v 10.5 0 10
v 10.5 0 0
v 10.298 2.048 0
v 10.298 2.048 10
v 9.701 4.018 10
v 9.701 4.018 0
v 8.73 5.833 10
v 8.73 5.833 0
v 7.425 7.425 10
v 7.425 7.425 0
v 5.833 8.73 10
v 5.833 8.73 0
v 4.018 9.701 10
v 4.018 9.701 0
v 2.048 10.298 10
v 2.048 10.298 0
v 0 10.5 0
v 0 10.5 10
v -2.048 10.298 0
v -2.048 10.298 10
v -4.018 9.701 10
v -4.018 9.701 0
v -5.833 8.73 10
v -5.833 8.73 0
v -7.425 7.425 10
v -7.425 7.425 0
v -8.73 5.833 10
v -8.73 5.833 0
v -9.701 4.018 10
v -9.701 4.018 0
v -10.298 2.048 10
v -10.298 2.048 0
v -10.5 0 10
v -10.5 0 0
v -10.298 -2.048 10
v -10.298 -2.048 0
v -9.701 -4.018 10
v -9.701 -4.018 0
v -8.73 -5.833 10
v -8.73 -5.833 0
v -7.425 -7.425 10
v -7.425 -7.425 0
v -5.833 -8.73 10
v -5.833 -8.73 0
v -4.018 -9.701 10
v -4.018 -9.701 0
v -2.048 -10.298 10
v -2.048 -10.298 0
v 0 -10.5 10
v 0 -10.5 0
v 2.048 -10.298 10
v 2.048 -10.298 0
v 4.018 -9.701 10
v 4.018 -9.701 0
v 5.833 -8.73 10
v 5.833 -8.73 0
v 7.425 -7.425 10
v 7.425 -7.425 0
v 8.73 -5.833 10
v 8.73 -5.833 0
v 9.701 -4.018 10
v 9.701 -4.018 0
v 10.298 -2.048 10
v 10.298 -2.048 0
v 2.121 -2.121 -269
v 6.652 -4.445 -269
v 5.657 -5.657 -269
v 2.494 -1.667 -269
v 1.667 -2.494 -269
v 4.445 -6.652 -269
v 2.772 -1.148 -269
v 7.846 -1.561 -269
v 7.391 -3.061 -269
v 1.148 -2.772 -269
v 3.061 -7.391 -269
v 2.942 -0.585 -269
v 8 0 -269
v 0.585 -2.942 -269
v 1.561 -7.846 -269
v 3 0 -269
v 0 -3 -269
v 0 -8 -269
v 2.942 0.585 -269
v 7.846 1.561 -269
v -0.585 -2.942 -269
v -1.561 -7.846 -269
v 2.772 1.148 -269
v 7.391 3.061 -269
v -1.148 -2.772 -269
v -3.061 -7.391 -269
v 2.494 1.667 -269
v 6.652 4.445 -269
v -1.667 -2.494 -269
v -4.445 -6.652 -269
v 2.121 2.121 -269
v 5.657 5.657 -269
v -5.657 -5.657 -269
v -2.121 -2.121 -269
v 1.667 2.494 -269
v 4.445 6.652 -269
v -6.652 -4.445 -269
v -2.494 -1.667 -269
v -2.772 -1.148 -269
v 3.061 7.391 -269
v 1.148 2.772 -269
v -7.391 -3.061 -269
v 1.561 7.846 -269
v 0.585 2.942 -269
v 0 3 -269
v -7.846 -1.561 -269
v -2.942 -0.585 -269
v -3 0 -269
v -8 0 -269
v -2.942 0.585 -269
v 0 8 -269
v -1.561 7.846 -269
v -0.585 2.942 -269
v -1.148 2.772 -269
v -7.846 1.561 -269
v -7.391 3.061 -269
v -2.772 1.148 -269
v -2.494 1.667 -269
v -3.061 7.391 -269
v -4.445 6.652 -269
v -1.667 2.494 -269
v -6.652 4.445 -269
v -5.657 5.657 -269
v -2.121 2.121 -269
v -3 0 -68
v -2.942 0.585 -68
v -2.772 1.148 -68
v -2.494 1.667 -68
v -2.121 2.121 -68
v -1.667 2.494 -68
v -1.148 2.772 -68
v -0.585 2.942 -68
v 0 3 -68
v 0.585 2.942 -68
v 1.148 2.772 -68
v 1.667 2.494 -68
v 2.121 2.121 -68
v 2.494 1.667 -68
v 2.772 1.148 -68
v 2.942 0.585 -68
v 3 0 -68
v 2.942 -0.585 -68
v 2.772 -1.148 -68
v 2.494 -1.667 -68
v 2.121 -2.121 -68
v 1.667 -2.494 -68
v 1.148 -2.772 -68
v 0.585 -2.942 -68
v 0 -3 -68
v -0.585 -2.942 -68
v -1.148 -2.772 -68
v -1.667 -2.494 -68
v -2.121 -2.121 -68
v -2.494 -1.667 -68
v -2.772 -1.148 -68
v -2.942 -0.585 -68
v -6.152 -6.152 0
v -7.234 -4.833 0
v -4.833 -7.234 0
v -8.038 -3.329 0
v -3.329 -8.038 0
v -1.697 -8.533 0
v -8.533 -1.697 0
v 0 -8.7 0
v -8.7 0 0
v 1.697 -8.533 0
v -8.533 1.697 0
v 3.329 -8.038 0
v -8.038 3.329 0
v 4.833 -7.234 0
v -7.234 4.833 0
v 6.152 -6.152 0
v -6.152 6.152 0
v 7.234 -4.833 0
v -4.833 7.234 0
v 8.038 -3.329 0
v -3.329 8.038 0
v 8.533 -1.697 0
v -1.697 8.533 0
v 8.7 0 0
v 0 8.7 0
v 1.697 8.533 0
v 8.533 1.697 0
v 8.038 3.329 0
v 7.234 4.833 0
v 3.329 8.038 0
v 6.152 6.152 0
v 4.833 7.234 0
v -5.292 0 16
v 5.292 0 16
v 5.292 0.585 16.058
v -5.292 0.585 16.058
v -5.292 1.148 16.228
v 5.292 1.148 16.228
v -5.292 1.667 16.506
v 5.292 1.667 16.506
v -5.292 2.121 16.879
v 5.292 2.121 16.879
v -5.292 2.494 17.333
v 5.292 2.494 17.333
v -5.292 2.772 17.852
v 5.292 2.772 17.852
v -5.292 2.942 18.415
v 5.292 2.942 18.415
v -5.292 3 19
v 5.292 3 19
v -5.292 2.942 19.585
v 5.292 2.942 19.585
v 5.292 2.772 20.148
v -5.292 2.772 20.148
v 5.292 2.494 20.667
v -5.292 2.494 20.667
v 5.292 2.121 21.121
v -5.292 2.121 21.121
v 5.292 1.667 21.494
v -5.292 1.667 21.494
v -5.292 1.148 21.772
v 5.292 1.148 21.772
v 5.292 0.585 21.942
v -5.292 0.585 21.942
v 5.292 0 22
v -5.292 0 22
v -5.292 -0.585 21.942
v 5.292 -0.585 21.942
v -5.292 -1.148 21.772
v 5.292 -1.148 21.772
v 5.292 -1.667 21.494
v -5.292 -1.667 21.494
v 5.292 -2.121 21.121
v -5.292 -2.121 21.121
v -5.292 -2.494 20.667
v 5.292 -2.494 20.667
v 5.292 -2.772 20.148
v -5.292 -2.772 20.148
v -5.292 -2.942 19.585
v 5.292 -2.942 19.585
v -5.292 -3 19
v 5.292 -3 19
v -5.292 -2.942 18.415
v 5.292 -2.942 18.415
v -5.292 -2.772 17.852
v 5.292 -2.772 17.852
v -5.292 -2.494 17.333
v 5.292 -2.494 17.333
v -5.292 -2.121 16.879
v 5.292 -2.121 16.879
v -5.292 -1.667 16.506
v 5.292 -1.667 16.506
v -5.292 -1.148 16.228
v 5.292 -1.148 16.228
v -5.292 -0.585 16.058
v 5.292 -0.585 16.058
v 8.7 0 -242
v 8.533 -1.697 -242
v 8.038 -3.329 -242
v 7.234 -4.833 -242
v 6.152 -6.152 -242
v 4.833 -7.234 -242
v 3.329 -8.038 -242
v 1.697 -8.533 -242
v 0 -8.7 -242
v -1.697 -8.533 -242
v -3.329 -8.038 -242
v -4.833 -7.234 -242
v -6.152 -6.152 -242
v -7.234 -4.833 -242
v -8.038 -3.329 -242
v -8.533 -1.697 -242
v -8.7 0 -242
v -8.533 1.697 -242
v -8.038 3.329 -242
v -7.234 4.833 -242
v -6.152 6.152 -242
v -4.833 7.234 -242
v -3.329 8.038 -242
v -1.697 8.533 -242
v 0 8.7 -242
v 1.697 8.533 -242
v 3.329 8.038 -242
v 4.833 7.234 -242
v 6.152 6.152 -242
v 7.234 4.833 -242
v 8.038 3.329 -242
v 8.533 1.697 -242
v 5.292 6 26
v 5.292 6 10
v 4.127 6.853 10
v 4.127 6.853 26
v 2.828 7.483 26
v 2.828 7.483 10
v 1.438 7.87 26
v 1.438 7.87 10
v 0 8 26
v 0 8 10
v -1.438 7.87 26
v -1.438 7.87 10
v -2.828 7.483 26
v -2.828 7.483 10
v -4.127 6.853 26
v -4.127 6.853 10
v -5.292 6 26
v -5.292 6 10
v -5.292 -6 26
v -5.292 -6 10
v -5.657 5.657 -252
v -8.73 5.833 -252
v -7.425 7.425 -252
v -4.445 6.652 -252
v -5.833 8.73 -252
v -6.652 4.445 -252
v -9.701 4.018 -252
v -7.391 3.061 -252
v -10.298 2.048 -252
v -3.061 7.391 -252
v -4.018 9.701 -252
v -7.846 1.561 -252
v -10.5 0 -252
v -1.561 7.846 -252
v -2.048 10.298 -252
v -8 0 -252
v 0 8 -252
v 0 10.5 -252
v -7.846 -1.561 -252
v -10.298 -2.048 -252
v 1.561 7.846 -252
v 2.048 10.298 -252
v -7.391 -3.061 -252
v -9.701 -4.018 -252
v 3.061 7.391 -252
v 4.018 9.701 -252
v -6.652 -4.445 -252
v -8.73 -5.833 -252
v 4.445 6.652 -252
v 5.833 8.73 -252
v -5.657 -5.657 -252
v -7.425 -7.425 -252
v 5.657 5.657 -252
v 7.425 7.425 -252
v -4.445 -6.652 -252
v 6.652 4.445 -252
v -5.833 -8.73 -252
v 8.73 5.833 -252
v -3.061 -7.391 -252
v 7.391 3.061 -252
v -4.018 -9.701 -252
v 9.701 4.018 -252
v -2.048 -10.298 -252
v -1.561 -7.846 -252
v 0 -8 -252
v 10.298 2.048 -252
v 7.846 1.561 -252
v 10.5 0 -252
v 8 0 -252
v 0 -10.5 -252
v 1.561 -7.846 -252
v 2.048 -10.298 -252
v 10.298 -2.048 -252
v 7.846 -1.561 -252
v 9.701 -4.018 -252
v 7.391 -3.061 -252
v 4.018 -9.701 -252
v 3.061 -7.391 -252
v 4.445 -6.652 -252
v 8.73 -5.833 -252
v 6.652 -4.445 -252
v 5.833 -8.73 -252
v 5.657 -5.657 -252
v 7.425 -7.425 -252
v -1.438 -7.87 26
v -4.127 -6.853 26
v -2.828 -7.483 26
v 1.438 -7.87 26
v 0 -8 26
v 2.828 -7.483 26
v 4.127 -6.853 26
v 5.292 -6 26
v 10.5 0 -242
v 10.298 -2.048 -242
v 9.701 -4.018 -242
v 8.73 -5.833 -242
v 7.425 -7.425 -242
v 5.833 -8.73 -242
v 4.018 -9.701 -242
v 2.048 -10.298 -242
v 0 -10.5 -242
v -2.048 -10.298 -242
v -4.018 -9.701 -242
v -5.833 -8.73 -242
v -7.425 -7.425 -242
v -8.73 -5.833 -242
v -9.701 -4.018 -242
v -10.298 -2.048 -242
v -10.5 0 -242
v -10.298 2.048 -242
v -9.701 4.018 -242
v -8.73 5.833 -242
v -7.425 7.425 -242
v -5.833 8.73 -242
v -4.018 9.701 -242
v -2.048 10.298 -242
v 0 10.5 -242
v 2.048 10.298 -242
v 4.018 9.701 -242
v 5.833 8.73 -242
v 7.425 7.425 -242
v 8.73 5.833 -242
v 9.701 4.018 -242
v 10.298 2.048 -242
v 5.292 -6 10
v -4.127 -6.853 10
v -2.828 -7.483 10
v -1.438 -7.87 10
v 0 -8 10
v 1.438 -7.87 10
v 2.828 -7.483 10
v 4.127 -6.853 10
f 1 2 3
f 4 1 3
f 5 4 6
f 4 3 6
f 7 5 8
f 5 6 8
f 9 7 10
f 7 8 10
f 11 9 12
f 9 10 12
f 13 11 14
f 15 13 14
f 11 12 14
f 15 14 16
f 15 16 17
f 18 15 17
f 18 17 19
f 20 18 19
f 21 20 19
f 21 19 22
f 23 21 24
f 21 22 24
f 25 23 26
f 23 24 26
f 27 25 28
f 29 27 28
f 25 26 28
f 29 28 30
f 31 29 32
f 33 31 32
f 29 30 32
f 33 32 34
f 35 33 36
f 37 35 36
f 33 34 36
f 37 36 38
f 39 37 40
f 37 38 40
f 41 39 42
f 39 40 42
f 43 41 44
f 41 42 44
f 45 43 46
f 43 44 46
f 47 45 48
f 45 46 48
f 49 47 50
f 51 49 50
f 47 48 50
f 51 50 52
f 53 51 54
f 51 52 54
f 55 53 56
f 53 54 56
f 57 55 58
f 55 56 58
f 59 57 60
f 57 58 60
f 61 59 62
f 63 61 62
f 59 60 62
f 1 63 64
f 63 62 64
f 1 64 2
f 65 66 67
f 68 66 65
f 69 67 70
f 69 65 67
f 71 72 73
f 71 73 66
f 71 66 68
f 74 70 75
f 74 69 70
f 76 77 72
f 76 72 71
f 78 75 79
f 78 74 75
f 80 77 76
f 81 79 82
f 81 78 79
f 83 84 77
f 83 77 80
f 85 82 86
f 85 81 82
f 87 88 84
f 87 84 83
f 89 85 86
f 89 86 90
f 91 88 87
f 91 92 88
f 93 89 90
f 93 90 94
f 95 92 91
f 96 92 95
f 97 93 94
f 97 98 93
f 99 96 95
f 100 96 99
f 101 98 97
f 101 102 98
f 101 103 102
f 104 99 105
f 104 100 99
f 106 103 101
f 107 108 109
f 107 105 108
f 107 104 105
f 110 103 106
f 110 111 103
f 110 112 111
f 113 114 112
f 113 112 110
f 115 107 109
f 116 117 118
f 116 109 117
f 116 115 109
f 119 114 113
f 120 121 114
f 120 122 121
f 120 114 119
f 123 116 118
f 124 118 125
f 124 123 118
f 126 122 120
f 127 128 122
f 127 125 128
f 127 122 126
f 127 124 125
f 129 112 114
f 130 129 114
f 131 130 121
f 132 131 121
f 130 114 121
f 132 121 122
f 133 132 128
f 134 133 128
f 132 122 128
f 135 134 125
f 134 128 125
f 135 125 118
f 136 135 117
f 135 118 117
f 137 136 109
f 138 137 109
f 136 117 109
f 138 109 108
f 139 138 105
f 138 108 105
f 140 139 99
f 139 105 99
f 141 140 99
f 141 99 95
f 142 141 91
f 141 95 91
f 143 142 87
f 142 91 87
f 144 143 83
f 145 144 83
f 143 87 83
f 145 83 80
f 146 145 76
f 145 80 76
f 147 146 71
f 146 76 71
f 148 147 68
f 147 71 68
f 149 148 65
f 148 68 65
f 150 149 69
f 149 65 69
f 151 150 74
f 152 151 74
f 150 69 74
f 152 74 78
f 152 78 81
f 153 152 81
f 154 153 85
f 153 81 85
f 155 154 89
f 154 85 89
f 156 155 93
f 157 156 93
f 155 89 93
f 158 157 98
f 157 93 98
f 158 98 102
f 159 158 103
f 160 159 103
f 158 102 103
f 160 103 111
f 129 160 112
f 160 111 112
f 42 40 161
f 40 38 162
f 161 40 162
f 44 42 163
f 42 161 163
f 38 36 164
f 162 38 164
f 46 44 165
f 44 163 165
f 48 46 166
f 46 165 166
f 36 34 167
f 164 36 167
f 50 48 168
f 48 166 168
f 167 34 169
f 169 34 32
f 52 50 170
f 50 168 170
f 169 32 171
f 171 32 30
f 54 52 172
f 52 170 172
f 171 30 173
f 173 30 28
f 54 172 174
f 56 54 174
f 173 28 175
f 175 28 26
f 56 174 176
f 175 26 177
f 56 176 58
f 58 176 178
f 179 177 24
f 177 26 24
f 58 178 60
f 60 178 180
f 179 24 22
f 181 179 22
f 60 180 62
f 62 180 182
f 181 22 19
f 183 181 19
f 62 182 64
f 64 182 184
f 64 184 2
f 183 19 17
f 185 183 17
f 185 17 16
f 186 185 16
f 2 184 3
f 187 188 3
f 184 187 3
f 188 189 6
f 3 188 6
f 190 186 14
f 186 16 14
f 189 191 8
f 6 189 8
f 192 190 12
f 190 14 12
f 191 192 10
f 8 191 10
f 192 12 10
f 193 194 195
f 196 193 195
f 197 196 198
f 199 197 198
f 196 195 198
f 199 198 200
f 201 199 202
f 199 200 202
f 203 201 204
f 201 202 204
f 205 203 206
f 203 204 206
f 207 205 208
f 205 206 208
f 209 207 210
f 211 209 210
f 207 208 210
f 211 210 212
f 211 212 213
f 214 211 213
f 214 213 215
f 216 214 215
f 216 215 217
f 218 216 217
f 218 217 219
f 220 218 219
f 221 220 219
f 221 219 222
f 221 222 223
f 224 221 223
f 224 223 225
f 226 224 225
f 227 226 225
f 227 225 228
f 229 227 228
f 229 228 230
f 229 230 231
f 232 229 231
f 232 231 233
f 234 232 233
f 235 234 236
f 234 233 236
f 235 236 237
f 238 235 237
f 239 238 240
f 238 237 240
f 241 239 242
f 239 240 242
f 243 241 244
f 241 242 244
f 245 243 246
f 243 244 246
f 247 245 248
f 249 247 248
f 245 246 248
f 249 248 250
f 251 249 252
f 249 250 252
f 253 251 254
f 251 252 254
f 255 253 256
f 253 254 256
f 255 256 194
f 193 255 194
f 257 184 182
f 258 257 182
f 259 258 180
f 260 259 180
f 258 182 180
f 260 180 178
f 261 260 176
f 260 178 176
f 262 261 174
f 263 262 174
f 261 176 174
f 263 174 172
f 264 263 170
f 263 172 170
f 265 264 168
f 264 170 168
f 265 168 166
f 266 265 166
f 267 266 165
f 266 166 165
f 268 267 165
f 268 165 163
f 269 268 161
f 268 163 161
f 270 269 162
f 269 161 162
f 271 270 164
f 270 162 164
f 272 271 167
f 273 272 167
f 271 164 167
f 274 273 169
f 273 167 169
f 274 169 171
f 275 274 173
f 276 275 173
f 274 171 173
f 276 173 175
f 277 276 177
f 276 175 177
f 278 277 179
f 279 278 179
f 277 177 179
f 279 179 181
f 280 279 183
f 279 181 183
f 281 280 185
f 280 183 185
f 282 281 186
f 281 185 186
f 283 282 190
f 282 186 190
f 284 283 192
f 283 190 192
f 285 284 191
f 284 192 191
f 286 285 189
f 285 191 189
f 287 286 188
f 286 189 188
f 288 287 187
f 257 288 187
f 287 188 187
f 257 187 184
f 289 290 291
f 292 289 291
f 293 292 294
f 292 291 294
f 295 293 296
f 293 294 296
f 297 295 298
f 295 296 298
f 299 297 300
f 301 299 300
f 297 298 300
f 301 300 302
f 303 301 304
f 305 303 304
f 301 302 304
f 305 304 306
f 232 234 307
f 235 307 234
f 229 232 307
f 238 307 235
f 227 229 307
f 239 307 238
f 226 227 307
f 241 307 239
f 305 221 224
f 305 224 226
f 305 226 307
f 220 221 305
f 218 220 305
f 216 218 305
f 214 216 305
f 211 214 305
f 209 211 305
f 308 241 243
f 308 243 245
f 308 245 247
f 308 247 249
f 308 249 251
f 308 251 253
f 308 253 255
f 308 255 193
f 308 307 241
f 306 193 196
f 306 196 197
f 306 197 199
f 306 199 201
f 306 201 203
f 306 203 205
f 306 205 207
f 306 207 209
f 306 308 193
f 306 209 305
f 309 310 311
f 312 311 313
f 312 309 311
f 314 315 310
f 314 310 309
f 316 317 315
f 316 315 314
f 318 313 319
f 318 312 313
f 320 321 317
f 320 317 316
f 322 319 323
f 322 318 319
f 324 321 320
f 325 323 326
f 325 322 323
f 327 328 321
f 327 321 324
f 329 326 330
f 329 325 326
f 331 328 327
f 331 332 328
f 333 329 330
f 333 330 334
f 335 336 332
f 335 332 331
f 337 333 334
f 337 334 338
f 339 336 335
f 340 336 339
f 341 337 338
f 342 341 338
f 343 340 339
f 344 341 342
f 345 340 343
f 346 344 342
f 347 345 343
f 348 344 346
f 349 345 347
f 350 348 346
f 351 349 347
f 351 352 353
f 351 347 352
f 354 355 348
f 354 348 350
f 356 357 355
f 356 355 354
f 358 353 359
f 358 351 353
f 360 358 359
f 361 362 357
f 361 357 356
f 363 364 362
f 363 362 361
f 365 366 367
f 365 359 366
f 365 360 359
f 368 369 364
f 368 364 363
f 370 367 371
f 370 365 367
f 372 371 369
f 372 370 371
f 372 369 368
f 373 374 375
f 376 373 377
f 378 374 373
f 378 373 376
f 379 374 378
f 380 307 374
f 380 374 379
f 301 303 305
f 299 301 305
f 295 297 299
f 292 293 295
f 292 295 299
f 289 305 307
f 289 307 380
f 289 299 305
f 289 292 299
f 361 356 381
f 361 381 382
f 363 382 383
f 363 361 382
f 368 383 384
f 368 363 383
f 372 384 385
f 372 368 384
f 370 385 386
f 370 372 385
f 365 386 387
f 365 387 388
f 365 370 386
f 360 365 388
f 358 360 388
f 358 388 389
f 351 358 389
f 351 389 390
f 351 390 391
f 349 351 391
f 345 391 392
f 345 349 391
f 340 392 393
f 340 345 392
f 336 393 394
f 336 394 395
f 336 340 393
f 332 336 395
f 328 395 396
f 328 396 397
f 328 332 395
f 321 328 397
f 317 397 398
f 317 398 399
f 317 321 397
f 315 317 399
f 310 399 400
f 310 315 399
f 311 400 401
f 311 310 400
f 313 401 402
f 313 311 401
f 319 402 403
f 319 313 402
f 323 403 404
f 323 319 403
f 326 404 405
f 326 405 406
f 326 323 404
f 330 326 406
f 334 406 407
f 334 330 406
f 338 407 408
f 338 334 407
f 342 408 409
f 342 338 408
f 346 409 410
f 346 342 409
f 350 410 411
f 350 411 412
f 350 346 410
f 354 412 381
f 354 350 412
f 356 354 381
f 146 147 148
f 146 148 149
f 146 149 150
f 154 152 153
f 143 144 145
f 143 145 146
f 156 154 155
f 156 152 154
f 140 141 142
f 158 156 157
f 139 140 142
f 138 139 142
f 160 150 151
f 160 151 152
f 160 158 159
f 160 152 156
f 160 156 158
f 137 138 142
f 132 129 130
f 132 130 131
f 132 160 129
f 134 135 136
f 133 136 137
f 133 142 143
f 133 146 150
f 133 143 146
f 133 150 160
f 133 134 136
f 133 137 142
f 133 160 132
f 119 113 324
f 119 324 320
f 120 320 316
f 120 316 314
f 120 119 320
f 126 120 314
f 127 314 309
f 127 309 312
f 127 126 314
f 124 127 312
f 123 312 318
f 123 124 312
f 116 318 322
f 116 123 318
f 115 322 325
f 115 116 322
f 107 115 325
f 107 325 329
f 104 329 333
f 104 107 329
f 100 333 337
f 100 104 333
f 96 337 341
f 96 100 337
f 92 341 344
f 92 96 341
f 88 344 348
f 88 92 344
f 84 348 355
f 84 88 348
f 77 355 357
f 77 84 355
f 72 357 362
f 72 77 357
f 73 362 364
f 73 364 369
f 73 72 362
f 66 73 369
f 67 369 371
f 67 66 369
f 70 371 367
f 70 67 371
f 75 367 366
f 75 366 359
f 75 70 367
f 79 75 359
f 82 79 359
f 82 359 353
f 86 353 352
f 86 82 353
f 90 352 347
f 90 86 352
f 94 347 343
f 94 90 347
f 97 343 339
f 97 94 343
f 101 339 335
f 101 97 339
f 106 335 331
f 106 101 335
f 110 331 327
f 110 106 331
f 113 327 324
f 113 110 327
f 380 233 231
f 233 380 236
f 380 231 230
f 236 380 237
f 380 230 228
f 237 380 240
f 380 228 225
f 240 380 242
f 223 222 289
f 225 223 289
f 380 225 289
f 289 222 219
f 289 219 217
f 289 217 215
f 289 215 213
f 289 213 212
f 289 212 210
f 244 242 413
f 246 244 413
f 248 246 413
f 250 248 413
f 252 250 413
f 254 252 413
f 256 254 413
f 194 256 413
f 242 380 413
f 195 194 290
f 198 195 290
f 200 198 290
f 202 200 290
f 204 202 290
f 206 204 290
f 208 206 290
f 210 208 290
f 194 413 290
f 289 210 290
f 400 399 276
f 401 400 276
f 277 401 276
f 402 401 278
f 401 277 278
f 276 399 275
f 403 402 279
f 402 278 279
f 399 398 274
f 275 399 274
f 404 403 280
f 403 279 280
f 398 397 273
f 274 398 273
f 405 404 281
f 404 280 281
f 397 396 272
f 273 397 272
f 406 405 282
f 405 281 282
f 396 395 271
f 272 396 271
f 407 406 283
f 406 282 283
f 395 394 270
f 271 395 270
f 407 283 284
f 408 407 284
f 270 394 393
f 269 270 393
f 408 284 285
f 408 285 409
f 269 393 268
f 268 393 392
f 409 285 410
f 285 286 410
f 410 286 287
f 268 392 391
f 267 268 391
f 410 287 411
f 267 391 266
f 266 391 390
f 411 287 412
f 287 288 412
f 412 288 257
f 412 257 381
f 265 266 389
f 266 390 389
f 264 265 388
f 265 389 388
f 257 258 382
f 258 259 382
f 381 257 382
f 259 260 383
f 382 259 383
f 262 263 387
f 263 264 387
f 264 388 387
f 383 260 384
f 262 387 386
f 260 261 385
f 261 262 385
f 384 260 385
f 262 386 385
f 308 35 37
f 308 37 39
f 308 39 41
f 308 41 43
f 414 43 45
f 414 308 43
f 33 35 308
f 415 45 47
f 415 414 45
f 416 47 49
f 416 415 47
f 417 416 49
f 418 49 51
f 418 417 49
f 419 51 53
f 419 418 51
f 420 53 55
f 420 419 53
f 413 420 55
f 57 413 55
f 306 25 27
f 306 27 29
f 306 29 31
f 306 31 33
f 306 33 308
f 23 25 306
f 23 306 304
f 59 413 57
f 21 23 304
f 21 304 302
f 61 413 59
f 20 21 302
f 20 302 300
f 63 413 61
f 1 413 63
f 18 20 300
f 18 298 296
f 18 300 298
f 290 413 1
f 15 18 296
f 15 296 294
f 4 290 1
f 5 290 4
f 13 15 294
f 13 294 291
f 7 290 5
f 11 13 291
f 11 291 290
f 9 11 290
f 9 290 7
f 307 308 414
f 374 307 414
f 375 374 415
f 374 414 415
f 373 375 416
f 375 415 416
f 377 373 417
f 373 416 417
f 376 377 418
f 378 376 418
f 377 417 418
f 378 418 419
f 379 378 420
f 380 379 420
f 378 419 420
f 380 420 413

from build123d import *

# Parameters (mm, degrees)
SKETCH1_R           = 10.5
BOSS_EXTRUDE1_DEPTH = 10
SKETCH2_W           = 10.583005244
SKETCH2_H           = 12
BOSS_EXTRUDE2_DEPTH = 16
CUT_EXTRUDE1_REACH  = 34.181
SKETCH3_R           = 3
SKETCH4_R           = 8.7
BOSS_EXTRUDE3_DEPTH = 242
BOSS_EXTRUDE4_START = 10
SKETCH5_R           = 10.5
BOSS_EXTRUDE4_DEPTH = 10
BOSS_EXTRUDE5_START = 17
SKETCH6_R           = 8
BOSS_EXTRUDE5_DEPTH = 17
SKETCH7_R           = 3
CUT_EXTRUDE2_DEPTH  = 201


with BuildPart() as part:
    # Sketch1 → Boss-Extrude1 (new body)
    with BuildSketch(Plane.XY):
        Circle(SKETCH1_R)
    extrude(amount=BOSS_EXTRUDE1_DEPTH)

    # Sketch2 → Boss-Extrude2 (add)
    with BuildSketch(Plane.XY.offset(10)):
        Rectangle(SKETCH2_W, SKETCH2_H)
        with BuildLine():
            ThreePointArc((5.291502622, 6), (0, 8), (-5.291502622, 6))
            Line((-5.291502622, 6), (5.291502622, 6))
        make_face()
        with BuildLine():
            Line((5.291502622, -6), (-5.291502622, -6))
            ThreePointArc((-5.291502622, -6), (0, -8), (5.291502622, -6))
        make_face()
    extrude(amount=BOSS_EXTRUDE2_DEPTH)

    # Sketch3 → Cut-Extrude1 (cut, up to next)
    with BuildSketch(Plane(origin=(5.291502622, 0, 0), x_dir=(0, 0, -1), z_dir=(1, 0, 0)), mode=Mode.PRIVATE) as cut_extrude1_sk1:
        with Locations((-19, 0)):
            Circle(SKETCH3_R)
    cut_extrude1_tool1 = extrude(cut_extrude1_sk1.sketch, amount=-CUT_EXTRUDE1_REACH, mode=Mode.PRIVATE) & part.part
    add(cut_extrude1_tool1.solids().sort_by_distance((5.291503, 0, 19))[0], mode=Mode.SUBTRACT)

    # Sketch4 → Boss-Extrude3 (add)
    with BuildSketch(Plane(origin=(0, 0, 0), x_dir=(-1, 0, 0), z_dir=(0, 0, -1))):
        with Locations(Location((0, 0, 0), (0, 0, 180))):
            Circle(SKETCH4_R)
    extrude(amount=BOSS_EXTRUDE3_DEPTH)

    # Sketch5 → Boss-Extrude4 (add)
    with BuildSketch(Plane(origin=(0, 0, -242), x_dir=(-1, 0, 0), z_dir=(0, 0, -1)).offset(BOSS_EXTRUDE4_START)):
        with Locations(Location((0, 0, 0), (0, 0, 180))):
            Circle(SKETCH5_R)
    extrude(amount=-BOSS_EXTRUDE4_DEPTH)

    # Sketch6 → Boss-Extrude5 (add)
    with BuildSketch(Plane(origin=(0, 0, -252), x_dir=(-1, 0, 0), z_dir=(0, 0, -1)).offset(BOSS_EXTRUDE5_START)):
        Circle(SKETCH6_R)
    extrude(amount=-BOSS_EXTRUDE5_DEPTH)

    # Sketch7 → Cut-Extrude2 (cut)
    with BuildSketch(Plane(origin=(0, 0, -269), x_dir=(-1, 0, 0), z_dir=(0, 0, -1))):
        Circle(SKETCH7_R)
    extrude(amount=-CUT_EXTRUDE2_DEPTH, mode=Mode.SUBTRACT)


solid = part.part
